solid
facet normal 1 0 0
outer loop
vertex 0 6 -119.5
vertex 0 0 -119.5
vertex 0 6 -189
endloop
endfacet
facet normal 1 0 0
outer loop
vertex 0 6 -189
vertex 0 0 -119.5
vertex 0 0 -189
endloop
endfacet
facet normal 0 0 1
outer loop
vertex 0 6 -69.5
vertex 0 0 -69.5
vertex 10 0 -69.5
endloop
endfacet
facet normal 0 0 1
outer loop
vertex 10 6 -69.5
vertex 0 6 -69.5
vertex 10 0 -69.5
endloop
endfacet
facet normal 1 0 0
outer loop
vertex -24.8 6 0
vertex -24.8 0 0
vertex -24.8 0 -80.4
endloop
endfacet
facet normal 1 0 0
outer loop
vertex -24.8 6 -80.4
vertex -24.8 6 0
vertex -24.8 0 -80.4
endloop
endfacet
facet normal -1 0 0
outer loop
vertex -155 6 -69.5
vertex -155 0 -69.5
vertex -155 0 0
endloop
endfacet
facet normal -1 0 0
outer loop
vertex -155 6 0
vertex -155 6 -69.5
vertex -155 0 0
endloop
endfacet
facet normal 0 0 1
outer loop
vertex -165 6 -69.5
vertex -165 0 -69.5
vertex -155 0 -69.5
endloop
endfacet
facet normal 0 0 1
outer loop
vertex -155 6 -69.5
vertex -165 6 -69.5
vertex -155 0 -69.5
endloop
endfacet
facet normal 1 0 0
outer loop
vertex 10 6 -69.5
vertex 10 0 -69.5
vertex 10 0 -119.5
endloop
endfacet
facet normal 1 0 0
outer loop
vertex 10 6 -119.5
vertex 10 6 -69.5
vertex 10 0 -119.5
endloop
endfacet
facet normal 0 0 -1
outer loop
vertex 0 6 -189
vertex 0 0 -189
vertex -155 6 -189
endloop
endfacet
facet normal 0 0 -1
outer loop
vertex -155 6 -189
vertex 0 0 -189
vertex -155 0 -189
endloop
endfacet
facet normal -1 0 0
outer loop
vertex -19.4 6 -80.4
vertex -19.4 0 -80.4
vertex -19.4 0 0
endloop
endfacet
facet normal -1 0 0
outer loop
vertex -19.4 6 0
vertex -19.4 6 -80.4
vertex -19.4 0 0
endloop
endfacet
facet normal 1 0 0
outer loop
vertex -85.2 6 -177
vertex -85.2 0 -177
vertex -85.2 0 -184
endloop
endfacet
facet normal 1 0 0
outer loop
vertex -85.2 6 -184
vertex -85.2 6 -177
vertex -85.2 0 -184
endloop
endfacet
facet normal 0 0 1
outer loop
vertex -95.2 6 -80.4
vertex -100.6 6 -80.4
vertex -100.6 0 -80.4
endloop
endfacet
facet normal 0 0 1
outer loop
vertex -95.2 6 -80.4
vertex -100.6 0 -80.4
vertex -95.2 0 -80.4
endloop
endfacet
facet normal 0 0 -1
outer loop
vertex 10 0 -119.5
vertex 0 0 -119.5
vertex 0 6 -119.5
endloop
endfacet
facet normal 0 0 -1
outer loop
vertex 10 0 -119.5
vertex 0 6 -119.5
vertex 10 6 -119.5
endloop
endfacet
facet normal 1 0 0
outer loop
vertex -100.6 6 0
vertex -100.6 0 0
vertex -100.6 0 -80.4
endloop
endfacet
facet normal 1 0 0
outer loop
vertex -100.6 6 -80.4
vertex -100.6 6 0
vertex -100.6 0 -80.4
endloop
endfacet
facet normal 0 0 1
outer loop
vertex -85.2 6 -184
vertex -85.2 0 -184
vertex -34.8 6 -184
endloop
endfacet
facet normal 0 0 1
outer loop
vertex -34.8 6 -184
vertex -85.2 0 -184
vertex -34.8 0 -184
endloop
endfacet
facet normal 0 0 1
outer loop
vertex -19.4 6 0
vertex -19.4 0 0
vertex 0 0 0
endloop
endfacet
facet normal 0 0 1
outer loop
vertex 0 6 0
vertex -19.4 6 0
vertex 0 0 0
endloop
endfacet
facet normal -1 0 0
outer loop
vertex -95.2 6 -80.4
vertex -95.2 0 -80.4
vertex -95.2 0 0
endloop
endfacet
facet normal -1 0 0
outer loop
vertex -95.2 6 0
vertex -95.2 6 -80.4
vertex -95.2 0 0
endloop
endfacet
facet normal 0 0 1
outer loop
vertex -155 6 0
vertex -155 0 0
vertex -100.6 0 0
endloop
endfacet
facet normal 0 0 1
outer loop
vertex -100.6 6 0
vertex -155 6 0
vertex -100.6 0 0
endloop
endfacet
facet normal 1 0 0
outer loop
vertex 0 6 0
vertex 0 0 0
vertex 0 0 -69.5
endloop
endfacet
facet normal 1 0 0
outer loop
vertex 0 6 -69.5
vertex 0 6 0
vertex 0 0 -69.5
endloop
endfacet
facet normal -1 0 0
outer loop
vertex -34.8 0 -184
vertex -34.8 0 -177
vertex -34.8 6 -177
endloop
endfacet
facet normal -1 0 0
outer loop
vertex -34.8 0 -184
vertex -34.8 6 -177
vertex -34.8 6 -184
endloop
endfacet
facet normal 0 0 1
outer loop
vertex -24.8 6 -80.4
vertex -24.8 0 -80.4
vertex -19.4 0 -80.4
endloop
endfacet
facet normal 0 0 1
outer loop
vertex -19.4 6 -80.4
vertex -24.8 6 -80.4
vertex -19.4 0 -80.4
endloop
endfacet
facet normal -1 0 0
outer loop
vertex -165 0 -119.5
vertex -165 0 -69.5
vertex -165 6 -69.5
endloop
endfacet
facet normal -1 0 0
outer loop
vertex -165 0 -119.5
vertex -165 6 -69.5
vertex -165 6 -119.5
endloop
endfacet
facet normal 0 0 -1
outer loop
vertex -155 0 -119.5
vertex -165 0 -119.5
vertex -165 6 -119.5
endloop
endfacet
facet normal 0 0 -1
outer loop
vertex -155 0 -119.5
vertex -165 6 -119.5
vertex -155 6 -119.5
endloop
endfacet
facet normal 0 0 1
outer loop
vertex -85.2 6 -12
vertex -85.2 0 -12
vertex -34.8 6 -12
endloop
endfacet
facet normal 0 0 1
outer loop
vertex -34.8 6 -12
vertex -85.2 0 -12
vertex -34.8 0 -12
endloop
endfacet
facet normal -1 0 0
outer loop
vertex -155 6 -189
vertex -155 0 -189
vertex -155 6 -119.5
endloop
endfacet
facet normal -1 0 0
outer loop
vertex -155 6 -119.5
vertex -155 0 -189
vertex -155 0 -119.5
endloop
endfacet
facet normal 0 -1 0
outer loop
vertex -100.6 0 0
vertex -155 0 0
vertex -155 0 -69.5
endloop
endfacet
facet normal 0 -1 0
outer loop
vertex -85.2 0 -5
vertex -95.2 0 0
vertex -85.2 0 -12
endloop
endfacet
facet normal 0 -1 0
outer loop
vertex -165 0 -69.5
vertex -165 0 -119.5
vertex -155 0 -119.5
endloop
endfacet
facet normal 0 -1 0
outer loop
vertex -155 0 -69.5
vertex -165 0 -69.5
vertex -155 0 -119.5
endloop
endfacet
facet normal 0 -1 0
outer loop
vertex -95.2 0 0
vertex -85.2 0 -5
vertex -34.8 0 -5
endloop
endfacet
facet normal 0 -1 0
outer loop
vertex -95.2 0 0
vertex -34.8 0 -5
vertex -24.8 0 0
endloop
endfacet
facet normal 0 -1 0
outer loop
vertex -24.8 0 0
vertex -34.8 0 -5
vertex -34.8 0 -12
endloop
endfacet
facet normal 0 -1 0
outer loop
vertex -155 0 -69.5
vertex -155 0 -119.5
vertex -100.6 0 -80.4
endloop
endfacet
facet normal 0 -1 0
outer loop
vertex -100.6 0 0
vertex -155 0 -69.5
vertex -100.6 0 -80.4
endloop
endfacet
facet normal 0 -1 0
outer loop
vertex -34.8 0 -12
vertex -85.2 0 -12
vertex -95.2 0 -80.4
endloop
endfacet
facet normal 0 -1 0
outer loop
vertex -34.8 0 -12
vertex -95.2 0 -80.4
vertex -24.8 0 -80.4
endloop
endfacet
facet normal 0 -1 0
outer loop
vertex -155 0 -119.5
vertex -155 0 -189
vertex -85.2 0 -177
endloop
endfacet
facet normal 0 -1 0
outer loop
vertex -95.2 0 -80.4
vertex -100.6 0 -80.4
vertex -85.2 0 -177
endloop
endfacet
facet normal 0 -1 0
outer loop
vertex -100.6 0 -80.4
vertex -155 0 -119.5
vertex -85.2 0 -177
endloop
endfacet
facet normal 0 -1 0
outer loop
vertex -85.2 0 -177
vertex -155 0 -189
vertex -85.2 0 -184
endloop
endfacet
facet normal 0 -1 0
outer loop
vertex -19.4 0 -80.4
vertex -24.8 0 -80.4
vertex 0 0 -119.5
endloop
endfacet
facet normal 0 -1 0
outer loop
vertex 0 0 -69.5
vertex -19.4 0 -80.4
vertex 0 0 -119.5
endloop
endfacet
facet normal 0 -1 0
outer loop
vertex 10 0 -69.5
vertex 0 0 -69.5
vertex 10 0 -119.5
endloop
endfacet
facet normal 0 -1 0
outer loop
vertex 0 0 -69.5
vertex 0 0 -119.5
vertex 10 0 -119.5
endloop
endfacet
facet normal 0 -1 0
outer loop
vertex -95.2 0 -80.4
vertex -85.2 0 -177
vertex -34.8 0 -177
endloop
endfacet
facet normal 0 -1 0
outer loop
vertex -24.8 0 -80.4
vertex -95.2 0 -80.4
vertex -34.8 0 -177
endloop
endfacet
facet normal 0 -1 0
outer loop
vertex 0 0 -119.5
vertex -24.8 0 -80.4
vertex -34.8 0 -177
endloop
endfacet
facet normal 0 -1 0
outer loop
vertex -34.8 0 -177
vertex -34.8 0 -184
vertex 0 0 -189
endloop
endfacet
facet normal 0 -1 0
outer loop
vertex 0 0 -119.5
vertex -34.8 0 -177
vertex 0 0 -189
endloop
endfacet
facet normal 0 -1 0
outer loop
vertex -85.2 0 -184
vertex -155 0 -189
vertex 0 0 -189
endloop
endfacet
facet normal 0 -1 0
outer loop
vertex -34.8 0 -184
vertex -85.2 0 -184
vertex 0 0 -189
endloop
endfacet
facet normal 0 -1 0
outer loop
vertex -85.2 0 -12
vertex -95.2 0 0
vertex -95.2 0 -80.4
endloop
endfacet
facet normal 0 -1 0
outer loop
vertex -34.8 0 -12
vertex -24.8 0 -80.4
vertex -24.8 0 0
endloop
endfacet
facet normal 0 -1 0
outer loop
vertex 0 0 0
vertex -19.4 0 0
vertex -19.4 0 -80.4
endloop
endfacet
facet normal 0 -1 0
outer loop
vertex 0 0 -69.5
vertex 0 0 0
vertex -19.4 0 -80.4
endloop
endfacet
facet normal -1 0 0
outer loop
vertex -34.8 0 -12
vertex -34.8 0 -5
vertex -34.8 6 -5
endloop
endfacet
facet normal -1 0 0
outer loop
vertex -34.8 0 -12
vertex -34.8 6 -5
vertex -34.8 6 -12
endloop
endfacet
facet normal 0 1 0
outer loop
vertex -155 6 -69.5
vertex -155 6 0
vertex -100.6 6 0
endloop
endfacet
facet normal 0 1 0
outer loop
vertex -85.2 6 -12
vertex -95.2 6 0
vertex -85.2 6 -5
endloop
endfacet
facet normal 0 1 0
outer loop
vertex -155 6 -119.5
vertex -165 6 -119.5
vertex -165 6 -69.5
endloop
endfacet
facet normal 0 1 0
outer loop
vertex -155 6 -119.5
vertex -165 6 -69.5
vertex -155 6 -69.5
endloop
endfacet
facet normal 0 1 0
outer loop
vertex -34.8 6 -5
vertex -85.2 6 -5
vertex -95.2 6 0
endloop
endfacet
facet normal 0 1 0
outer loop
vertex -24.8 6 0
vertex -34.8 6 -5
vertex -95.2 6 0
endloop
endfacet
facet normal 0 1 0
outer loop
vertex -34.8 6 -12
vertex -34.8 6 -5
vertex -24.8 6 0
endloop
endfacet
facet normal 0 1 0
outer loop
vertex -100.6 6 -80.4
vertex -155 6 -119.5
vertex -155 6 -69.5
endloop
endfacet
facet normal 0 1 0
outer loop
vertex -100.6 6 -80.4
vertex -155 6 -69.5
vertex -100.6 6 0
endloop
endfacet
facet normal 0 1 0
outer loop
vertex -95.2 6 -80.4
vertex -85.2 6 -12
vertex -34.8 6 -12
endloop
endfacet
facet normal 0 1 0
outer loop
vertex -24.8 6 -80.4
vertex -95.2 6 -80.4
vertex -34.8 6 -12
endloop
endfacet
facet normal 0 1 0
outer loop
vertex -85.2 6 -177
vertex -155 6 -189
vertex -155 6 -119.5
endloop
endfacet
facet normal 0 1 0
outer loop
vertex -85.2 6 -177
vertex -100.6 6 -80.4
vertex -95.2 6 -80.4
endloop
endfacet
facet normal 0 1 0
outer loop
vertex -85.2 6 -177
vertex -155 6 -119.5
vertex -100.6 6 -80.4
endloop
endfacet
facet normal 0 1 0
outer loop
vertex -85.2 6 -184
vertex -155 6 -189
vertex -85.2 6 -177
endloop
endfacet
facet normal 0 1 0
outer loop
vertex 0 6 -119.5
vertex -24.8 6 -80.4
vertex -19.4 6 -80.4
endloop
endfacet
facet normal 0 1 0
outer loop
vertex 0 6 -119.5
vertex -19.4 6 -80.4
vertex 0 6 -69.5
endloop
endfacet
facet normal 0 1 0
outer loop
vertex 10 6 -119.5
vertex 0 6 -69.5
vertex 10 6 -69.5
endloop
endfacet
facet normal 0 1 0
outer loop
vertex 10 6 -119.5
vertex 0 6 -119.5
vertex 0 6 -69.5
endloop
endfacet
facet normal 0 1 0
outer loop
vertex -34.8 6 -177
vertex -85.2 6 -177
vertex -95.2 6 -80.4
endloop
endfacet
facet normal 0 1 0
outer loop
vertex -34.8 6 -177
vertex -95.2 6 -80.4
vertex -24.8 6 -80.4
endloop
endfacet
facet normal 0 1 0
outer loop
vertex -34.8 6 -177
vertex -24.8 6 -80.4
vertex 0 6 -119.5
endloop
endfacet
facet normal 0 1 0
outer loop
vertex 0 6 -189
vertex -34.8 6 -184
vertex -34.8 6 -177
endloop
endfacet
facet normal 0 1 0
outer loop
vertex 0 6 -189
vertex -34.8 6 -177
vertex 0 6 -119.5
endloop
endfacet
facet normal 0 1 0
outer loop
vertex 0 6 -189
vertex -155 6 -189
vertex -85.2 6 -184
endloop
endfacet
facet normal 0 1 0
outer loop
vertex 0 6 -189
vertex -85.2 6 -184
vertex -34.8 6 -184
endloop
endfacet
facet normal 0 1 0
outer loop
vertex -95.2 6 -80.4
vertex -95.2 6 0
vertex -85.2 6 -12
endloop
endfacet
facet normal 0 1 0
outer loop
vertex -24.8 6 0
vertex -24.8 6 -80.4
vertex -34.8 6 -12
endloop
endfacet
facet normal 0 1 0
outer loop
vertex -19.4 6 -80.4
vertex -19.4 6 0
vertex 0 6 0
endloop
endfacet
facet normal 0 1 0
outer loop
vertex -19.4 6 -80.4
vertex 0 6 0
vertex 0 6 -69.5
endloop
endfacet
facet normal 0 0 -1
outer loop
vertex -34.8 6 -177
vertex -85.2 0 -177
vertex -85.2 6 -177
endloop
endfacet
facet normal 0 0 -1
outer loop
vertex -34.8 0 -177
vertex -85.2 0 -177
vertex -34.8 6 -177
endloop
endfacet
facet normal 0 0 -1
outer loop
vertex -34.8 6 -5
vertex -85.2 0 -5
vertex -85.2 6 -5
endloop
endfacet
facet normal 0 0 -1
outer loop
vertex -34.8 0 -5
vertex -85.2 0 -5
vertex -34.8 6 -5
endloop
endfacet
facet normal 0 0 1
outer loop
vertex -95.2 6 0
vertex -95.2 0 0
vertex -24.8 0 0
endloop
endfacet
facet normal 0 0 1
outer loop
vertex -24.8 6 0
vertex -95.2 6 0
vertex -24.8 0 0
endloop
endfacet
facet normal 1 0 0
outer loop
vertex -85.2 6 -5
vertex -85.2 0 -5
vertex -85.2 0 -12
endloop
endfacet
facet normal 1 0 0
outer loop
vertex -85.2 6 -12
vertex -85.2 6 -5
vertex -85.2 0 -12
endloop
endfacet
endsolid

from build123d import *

# Parameters (mm, degrees)
SKETCH1_W           = 50.4
SKETCH1_H           = 7
SKETCH1_W_2         = 10
SKETCH1_H_2         = 50
BOSS_EXTRUDE1_DEPTH = 6


with BuildPart() as part:
    # Sketch1 → Boss-Extrude1 (new body)
    with BuildSketch(Plane(origin=(0, 0, 0), x_dir=(1, 0, 0), z_dir=(0, 1, 0))):
        Polygon((-19.4, 0), (0, 0), (0, 69.5), (0, 119.5), (0, 189), (-155, 189), (-155, 119.5), (-155, 69.5), (-155, 0), (-100.6, 0), (-100.6, 80.4), (-95.2, 80.4), (-95.2, 0), (-75, 0), (-25, 0), (-24.8, 0), (-24.8, 80.4), (-19.4, 80.4), align=None)
        with Locations((-60, 8.5)):
            Rectangle(SKETCH1_W, SKETCH1_H, mode=Mode.SUBTRACT)
        with Locations((-60, 180.5)):
            Rectangle(SKETCH1_W, SKETCH1_H, mode=Mode.SUBTRACT)
        with Locations((-160, 94.5)):
            Rectangle(SKETCH1_W_2, SKETCH1_H_2)
        with Locations((5, 94.5)):
            Rectangle(SKETCH1_W_2, SKETCH1_H_2)
    extrude(amount=BOSS_EXTRUDE1_DEPTH)


solid = part.part
